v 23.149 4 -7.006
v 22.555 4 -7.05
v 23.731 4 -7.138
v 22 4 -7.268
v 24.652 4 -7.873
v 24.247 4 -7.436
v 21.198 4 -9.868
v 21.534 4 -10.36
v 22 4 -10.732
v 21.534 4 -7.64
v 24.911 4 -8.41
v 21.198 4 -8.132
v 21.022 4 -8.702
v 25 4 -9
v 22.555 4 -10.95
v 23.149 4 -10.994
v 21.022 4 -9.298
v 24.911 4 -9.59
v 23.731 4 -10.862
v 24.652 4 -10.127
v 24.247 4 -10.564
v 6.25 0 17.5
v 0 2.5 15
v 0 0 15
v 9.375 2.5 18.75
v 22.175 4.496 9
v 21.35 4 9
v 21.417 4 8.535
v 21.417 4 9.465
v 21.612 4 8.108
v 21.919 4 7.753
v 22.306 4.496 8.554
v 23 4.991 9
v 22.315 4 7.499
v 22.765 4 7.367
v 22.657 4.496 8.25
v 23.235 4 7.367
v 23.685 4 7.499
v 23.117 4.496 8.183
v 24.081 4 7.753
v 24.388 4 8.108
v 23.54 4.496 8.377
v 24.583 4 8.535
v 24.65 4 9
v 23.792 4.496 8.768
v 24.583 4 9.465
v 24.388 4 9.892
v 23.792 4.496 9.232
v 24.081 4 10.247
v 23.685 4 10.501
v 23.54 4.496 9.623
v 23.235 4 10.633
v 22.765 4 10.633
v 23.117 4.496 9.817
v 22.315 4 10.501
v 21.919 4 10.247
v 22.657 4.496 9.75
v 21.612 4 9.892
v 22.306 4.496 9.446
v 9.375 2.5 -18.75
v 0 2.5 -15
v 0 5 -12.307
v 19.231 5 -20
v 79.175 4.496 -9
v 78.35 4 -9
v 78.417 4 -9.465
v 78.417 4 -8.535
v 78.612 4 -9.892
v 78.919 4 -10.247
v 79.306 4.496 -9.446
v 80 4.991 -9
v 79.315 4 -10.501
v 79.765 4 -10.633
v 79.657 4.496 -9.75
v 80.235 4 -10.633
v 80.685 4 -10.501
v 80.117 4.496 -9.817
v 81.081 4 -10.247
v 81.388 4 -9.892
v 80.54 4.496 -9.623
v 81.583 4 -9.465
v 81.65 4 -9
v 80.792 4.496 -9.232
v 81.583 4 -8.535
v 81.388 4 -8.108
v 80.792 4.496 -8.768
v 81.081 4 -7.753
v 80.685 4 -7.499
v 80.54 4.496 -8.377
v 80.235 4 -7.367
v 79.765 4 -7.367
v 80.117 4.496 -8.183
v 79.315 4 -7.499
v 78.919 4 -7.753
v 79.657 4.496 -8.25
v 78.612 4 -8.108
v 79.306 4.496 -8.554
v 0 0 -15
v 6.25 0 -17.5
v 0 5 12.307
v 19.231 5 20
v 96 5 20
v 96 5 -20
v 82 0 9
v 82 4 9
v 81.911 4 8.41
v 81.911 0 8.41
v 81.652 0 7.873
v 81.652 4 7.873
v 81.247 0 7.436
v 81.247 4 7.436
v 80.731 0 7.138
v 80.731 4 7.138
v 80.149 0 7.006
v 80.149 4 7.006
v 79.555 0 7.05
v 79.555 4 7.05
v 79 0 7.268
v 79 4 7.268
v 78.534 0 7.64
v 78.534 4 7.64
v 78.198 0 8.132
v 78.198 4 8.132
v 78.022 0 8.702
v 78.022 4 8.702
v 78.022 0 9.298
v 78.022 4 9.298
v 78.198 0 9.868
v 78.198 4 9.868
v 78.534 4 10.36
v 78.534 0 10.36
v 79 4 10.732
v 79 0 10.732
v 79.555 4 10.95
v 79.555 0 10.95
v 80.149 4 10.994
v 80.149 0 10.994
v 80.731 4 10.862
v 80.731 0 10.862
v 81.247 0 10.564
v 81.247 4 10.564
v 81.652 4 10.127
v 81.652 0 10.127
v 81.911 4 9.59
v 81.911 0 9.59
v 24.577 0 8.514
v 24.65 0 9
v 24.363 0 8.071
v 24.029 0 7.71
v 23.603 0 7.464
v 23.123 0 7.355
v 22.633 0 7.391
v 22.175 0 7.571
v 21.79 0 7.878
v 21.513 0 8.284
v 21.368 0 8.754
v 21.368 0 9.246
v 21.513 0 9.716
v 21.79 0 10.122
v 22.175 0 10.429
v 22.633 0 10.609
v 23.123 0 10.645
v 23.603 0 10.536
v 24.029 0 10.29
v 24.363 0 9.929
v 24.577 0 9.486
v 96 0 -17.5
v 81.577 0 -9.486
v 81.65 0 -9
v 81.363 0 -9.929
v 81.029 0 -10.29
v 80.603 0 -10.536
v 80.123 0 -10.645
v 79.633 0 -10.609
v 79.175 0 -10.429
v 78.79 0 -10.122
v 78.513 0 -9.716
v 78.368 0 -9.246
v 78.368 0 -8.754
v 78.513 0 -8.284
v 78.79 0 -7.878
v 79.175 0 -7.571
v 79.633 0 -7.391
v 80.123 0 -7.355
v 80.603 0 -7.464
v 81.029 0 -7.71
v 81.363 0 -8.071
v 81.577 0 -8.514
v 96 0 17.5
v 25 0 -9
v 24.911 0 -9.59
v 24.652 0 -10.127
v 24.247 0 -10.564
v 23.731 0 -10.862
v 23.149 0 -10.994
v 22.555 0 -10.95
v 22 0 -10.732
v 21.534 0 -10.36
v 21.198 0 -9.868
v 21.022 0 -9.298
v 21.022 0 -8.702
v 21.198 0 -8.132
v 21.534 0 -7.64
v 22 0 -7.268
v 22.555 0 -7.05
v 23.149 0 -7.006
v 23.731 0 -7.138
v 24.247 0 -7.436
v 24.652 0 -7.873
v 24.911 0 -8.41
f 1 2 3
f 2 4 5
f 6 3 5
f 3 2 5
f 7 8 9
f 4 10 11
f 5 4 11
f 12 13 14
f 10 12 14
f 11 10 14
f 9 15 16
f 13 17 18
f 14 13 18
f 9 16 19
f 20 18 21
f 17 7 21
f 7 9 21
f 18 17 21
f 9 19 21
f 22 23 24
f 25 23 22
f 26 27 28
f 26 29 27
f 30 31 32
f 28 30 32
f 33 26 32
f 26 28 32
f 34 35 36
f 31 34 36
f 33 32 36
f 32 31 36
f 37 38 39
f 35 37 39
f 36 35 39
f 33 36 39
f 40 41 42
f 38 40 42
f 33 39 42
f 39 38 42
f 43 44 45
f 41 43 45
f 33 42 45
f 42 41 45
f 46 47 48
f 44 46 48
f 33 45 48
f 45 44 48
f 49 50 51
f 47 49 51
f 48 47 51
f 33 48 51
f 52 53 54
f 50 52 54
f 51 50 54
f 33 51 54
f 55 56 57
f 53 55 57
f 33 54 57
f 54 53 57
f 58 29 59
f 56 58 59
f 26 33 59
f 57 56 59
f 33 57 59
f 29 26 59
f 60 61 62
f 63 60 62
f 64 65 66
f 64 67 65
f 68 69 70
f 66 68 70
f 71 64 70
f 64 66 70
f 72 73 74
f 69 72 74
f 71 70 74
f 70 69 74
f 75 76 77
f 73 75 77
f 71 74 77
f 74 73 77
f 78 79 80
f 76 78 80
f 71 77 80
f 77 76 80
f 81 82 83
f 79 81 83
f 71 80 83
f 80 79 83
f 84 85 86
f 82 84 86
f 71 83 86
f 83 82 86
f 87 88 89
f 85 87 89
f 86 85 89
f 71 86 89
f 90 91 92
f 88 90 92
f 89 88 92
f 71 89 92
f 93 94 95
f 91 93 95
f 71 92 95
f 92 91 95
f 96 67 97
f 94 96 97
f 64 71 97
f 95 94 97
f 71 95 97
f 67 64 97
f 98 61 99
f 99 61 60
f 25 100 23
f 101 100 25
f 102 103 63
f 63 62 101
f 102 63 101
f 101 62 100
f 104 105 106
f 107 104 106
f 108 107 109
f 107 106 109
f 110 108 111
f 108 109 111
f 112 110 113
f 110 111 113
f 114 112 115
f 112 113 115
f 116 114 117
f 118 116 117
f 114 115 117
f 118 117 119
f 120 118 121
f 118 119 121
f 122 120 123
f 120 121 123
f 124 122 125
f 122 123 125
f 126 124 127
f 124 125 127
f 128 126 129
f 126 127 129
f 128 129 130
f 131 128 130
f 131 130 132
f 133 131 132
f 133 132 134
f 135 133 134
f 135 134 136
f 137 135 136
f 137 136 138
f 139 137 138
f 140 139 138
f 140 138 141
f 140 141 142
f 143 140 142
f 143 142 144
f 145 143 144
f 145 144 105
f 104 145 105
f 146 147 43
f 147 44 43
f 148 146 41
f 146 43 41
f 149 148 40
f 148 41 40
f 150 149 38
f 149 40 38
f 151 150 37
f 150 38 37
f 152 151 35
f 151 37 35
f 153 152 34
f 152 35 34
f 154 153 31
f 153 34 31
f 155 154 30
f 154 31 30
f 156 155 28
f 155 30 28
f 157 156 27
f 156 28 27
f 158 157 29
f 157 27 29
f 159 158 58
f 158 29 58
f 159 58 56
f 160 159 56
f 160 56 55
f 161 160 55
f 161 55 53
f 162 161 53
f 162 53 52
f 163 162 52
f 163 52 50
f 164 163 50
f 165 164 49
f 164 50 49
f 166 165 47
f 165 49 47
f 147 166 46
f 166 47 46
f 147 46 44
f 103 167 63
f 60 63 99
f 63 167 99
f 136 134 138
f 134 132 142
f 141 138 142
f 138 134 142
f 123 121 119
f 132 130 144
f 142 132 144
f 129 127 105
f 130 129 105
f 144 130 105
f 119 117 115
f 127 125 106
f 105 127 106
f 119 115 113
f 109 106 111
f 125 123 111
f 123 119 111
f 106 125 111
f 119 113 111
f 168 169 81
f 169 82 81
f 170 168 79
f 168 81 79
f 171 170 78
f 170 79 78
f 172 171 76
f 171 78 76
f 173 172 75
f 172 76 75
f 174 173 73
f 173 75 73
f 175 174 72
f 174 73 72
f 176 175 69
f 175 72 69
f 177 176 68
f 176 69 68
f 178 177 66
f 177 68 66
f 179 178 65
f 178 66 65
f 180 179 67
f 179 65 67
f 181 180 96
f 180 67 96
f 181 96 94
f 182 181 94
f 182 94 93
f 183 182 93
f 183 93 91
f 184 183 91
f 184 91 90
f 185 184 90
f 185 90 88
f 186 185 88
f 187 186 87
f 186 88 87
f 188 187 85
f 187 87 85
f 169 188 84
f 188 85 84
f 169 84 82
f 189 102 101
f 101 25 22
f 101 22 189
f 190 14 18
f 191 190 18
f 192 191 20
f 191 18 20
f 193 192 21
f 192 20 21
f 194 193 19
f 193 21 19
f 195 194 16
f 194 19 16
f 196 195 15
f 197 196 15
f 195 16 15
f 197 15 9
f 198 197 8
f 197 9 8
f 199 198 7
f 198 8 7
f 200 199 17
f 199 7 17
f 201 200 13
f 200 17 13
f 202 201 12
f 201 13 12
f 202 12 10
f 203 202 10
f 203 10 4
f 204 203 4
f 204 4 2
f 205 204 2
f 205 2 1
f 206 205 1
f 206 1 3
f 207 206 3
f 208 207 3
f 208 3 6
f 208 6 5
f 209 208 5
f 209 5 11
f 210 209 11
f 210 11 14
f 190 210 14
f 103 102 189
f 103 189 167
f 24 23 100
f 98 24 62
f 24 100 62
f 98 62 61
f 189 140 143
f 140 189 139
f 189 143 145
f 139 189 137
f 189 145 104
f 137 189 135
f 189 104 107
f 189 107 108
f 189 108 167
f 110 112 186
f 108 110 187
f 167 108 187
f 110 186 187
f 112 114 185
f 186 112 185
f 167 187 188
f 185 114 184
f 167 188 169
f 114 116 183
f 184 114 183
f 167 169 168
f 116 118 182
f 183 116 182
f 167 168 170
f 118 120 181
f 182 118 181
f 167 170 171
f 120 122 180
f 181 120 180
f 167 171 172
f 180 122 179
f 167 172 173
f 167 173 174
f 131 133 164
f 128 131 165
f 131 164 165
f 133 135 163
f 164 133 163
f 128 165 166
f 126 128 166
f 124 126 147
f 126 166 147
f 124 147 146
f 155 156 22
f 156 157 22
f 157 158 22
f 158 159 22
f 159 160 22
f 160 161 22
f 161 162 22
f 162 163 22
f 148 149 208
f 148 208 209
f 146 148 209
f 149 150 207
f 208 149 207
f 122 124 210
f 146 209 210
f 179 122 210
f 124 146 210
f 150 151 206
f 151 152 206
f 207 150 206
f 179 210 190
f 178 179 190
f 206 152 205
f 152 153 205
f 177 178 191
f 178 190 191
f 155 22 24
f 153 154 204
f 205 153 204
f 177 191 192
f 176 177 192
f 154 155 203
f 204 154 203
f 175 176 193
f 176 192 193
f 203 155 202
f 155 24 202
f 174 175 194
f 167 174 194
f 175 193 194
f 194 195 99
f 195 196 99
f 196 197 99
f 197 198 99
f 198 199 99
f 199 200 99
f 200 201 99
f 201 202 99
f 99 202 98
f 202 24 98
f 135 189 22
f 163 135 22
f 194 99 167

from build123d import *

# Parameters (mm, degrees)
BOSS_EXTRUDE2_DEPTH       = 96
CUT_EXTRUDE1_REACH        = 7
CHAMFER1_SIZE             = 2.5
F_4_0MM_DOWEL_HOLE1_D     = 4
F_4_0MM_DOWEL_HOLE1_DEPTH = 4
M4X0_7_TAPPED_HOLE1_D     = 3.3
M4X0_7_TAPPED_HOLE1_DEPTH = 4
M4X0_7_TAPPED_HOLE1_TIP   = 0.991420021


with BuildPart() as part:
    # Sketch3 → Boss-Extrude2 (new body)
    with BuildSketch(Plane(origin=(0, 0, 0), x_dir=(0, 0, -1), z_dir=(1, 0, 0))):
        Polygon((-20, 5), (-17.5, 0), (17.5, 0), (20, 5), align=None)
    extrude(amount=BOSS_EXTRUDE2_DEPTH)

    # Sketch5 → Cut-Extrude1 (cut, up to next)
    with BuildSketch(Plane(origin=(0, 5, 0), x_dir=(1, 0, 0), z_dir=(0, 1, 0)), mode=Mode.PRIVATE) as cut_extrude1_sk1:
        Polygon((0, 15), (12.5, 20), (0, 20), align=None)
    cut_extrude1_tool1 = extrude(cut_extrude1_sk1.sketch, amount=-CUT_EXTRUDE1_REACH, mode=Mode.PRIVATE) & part.part
    add(cut_extrude1_tool1.solids().sort_by_distance((4.166667, 5, -18.333333))[0], mode=Mode.SUBTRACT)
    # Sketch5 → Cut-Extrude1 (cut, up to next)
    with BuildSketch(Plane(origin=(0, 5, 0), x_dir=(1, 0, 0), z_dir=(0, 1, 0)), mode=Mode.PRIVATE) as cut_extrude1_sk2:
        Polygon((0, -20), (0, -15), (12.5, -20), align=None)
    cut_extrude1_tool2 = extrude(cut_extrude1_sk2.sketch, amount=-CUT_EXTRUDE1_REACH, mode=Mode.PRIVATE) & part.part
    add(cut_extrude1_tool2.solids().sort_by_distance((4.166667, 5, 18.333333))[0], mode=Mode.SUBTRACT)

    # Chamfer1
    chamfer1_edges = [part.edges().sort_by_distance(p)[0] for p in [
        (6.25, 5, -17.5),
        (6.25, 5, 17.5),
    ]]
    chamfer(chamfer1_edges, length=CHAMFER1_SIZE)

    # Ø4.0mm Dowel Hole1
    with Locations(Plane(origin=(0, 0, 0), x_dir=(-1, 0, 0), z_dir=(0, -1, 0))):
        with Locations((-23, 9), (-80, -9)):
            Hole(F_4_0MM_DOWEL_HOLE1_D / 2, depth=F_4_0MM_DOWEL_HOLE1_DEPTH)

    # M4x0.7 Tapped Hole1
    with Locations(Plane(origin=(0, 0, 0), x_dir=(-1, 0, 0), z_dir=(0, -1, 0))):
        with Locations((-23, -9), (-80, 9)):
            Hole(M4X0_7_TAPPED_HOLE1_D / 2, depth=M4X0_7_TAPPED_HOLE1_DEPTH)
            with Locations((0, 0, -(M4X0_7_TAPPED_HOLE1_DEPTH + M4X0_7_TAPPED_HOLE1_TIP / 2))):  # 118° drill point
                Cone(0, M4X0_7_TAPPED_HOLE1_D / 2, M4X0_7_TAPPED_HOLE1_TIP, mode=Mode.SUBTRACT)


solid = part.part
